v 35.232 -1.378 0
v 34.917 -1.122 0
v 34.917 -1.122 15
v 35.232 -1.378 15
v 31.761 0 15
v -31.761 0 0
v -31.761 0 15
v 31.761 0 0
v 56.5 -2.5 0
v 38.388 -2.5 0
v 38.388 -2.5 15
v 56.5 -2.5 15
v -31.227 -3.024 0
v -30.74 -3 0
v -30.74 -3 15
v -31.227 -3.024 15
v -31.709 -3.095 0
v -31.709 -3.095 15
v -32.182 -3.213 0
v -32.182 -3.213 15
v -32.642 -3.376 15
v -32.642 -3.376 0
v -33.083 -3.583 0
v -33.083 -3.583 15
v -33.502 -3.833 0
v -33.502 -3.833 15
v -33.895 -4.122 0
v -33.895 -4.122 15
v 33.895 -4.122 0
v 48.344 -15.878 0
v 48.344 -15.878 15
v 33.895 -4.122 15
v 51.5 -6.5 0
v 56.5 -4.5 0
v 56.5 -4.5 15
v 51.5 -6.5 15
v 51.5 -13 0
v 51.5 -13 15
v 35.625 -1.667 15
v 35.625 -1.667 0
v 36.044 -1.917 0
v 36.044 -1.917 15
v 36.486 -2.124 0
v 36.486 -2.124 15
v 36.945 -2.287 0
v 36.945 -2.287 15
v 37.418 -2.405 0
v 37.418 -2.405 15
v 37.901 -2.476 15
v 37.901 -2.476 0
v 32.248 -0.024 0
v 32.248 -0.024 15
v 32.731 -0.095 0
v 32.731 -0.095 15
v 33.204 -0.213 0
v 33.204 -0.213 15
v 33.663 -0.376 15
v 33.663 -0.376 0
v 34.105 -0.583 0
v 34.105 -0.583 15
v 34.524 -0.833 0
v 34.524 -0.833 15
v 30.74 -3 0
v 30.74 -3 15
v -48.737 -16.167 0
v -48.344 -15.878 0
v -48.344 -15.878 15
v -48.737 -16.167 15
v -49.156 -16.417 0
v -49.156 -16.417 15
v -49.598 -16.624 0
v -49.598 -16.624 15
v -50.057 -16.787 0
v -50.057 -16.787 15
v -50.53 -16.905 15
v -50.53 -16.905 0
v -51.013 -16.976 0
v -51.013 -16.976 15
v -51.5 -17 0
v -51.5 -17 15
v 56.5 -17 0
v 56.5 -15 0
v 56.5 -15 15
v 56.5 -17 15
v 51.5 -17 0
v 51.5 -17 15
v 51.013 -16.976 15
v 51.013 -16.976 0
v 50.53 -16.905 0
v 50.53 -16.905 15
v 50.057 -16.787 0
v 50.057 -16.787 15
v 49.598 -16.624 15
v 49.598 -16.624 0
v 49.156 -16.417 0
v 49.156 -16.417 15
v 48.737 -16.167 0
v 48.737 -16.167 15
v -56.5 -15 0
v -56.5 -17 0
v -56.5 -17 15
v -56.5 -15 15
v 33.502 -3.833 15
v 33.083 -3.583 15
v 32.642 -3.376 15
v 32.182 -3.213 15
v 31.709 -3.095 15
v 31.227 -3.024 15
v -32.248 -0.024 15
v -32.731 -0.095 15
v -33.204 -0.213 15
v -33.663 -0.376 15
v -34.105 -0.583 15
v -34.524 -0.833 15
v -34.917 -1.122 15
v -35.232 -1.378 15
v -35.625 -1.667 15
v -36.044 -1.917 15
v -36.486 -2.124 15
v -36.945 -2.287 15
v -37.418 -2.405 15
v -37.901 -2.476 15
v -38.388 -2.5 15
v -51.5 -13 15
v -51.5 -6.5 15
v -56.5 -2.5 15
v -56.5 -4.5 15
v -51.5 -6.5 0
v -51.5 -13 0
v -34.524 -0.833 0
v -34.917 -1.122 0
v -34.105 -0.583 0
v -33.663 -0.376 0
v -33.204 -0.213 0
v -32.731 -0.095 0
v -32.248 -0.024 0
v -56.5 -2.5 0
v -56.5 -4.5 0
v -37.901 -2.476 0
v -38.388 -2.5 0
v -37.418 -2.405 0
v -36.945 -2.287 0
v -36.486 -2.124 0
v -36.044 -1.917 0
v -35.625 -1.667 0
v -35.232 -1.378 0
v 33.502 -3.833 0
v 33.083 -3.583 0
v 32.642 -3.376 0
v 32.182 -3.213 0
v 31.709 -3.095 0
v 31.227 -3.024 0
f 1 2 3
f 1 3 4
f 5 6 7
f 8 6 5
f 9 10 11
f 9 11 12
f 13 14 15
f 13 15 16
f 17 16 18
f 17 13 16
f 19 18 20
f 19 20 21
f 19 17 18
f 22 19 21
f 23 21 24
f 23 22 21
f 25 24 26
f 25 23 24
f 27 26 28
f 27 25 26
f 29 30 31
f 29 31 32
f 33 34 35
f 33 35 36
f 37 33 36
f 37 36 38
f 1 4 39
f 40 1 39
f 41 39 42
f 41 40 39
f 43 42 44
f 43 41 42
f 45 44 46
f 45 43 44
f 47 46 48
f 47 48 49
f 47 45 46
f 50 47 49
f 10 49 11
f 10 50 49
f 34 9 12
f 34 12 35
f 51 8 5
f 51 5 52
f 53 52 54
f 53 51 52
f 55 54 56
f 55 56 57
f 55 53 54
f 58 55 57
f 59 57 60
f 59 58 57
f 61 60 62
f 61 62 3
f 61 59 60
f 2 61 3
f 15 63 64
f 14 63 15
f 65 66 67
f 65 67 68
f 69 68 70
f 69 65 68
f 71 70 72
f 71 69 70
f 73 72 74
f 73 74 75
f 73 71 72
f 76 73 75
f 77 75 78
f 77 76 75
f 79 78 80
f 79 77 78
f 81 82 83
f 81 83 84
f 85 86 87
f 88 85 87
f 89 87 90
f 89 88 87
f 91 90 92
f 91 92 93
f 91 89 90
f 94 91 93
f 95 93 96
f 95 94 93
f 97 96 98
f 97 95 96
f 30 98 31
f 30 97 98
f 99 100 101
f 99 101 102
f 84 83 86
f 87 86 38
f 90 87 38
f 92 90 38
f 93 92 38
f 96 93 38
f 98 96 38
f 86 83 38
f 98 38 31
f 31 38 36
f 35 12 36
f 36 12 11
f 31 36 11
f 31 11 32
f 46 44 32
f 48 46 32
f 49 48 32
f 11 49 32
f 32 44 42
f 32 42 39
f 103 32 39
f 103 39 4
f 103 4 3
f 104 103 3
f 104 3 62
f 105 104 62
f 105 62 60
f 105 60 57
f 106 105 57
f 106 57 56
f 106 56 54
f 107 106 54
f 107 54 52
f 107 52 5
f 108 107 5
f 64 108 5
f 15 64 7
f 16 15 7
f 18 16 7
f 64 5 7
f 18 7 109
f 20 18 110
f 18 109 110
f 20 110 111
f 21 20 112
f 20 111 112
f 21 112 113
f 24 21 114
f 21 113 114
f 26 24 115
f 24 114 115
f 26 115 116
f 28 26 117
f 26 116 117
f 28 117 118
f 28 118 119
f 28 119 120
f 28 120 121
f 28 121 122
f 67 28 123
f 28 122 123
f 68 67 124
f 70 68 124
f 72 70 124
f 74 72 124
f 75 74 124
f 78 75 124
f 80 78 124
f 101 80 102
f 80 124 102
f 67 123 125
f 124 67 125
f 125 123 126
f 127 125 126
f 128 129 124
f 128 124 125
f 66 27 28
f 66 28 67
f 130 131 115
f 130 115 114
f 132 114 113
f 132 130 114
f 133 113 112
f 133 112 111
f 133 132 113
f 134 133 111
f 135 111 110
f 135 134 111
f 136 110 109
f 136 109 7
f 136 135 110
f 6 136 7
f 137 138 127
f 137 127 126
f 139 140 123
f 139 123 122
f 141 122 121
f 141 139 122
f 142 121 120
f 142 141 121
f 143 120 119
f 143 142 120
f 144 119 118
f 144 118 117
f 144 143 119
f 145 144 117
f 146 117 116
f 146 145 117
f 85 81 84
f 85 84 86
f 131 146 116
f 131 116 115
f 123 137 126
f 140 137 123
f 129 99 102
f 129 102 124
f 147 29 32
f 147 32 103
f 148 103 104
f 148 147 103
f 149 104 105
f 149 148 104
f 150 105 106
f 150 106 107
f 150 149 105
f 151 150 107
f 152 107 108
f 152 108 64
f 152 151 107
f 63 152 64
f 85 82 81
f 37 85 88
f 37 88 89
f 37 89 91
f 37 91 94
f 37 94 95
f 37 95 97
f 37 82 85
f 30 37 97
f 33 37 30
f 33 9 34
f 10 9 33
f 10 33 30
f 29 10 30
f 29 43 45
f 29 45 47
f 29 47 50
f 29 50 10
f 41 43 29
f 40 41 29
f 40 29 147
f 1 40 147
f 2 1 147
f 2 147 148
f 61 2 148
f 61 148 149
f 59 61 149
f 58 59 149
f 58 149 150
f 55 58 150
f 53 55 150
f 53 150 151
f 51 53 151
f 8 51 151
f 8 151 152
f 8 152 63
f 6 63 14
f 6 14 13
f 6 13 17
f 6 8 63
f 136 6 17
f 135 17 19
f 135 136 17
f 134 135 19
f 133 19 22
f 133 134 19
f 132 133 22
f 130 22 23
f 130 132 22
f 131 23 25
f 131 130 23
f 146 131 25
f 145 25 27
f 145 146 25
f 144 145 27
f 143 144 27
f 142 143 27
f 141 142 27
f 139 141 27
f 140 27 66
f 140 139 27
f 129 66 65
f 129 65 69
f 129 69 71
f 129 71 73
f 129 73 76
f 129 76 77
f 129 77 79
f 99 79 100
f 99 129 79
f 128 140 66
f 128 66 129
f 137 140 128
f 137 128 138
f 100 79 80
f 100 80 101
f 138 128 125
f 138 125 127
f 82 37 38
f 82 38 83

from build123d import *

# Parameters (mm, degrees)
BOSS_EXTRUDE1_DEPTH = 15


with BuildPart() as part:
    # Sketch1 → Boss-Extrude1 (new body)
    with BuildSketch(Plane.XY):
        with BuildLine():
            Line((30.739596692, -3), (-30.739596692, -3))
            ThreePointArc((-30.739596692, -3), (-32.414147122, -3.288749544), (-33.895287282, -4.121647657))
            Line((-33.895287282, -4.121647657), (-48.34430941, -15.878352343))
            ThreePointArc((-48.34430941, -15.878352343), (-49.82544957, -16.711250456), (-51.5, -17))
            Line((-51.5, -17), (-56.5, -17))
            Line((-56.5, -17), (-56.5, -15))
            Line((-56.5, -15), (-51.5, -13))
            Line((-51.5, -13), (-51.5, -6.5))
            Line((-51.5, -6.5), (-56.5, -4.5))
            Line((-56.5, -4.5), (-56.5, -2.5))
            Line((-56.5, -2.5), (-38.387912283, -2.5))
            ThreePointArc((-38.387912283, -2.5), (-36.713361853, -2.211250456), (-35.232221692, -1.378352343))
            Line((-35.232221692, -1.378352343), (-34.916730933, -1.121647657))
            ThreePointArc((-34.916730933, -1.121647657), (-33.435590772, -0.288749544), (-31.761040342, 0))
            Line((-31.761040342, 0), (31.761040342, 0))
            ThreePointArc((31.761040342, 0), (33.435590772, -0.288749544), (34.916730933, -1.121647657))
            Line((34.916730933, -1.121647657), (35.232221692, -1.378352343))
            ThreePointArc((35.232221692, -1.378352343), (36.713361853, -2.211250456), (38.387912283, -2.5))
            Line((38.387912283, -2.5), (56.5, -2.5))
            Line((56.5, -2.5), (56.5, -4.5))
            Line((56.5, -4.5), (51.5, -6.5))
            Line((51.5, -6.5), (51.5, -13))
            Line((51.5, -13), (56.5, -15))
            Line((56.5, -15), (56.5, -17))
            Line((56.5, -17), (51.5, -17))
            ThreePointArc((51.5, -17), (49.82544957, -16.711250456), (48.34430941, -15.878352343))
            Line((48.34430941, -15.878352343), (33.895287282, -4.121647657))
            ThreePointArc((33.895287282, -4.121647657), (32.414147122, -3.288749544), (30.739596692, -3))
        make_face()
    extrude(amount=BOSS_EXTRUDE1_DEPTH)


solid = part.part
